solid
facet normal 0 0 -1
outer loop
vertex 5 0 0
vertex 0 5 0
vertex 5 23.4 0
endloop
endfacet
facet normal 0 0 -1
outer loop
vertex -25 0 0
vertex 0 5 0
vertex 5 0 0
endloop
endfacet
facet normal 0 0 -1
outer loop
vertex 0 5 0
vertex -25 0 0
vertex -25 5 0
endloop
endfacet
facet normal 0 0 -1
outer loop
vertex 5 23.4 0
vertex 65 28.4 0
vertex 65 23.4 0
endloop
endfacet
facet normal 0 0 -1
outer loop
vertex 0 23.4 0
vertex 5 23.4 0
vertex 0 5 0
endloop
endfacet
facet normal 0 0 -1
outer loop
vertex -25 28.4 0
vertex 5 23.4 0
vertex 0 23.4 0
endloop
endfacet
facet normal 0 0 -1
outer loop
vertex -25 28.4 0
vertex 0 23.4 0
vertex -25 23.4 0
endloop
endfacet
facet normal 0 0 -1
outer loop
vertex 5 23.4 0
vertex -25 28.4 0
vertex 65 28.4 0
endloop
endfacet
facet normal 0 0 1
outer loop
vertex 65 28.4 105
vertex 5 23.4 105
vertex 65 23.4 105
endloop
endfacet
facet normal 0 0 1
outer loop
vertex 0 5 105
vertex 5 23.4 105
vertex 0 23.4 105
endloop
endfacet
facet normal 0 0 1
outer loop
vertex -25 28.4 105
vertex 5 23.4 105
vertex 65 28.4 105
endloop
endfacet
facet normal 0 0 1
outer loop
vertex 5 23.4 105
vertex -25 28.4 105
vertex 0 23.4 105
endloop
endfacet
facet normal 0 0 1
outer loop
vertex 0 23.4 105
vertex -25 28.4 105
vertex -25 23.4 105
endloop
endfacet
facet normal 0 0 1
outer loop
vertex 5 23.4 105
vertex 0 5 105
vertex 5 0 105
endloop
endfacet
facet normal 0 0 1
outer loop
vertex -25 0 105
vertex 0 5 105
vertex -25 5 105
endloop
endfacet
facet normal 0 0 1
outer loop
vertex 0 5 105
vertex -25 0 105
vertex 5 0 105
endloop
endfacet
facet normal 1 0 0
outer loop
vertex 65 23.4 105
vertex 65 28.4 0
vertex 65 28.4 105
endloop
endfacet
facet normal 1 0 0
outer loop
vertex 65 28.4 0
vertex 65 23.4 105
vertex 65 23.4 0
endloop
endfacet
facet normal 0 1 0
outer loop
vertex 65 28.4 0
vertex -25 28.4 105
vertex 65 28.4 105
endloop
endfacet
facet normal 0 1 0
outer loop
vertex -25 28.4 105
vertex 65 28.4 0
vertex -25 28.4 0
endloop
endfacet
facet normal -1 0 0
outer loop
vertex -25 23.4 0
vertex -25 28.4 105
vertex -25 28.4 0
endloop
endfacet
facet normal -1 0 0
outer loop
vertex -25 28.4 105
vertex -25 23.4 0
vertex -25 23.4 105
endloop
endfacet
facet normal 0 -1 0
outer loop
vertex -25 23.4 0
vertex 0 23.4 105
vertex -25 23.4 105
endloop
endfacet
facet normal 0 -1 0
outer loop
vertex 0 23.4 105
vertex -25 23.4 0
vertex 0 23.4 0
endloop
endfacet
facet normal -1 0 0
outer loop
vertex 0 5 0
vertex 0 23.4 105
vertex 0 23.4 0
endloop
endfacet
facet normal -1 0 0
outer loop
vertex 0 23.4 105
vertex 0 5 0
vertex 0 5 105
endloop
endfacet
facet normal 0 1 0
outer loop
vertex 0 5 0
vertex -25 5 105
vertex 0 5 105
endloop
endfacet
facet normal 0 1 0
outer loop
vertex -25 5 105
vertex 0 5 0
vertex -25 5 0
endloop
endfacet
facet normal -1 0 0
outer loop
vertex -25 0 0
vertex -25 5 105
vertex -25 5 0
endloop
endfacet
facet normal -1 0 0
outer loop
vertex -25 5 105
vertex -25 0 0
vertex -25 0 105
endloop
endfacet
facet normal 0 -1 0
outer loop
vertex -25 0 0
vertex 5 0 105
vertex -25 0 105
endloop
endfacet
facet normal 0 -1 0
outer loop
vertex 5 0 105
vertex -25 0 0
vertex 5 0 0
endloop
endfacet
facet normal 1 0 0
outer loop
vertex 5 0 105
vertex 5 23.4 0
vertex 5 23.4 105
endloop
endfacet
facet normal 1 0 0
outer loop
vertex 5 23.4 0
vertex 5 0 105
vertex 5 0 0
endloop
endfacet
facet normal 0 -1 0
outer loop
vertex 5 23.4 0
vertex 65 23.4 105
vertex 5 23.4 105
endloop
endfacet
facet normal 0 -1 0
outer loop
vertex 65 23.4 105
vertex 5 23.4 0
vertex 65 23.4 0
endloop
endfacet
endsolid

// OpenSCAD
// --- Dimensions ---
shelf_thickness = 18.0;      // Thickness of the shelf (mm)
clamp_gap = 18.4;            // Gap for the shelf (mm)
spine_width = 5.0;           // Width of the vertical spine (mm)
spine_depth = 28.4;          // Depth of the spine (mm)
bottom_jaw_width = 25.0;     // Width of the bottom jaw (mm)
bottom_jaw_depth = 5.0;       // Depth of the bottom jaw (mm)
arm_length = 65.0;           // Length of the arm extending forward (mm)
total_height = 105.0;        // Extrusion length along Z (mm)
hole_diameter = 20.0;        // Diameter of pipette holes (mm)
hole_x_offset = 42.0;        // X position of hole centers (mm)

// Hole Z-positions (as specified for the print orientation)
hole_z_1 = 17.5;
hole_z_2 = 52.5;
hole_z_3 = 87.5;

// --- Constants ---
$fn = 64;

// --- Modeling ---

// The user specified:
// 1. Print orientation: Lying on its side, XY plane is the profile, Z is extrusion (105mm).
// 2. Profile: 
//    - Spine: x=[0, 5], y=[0, 28.4]
//    - Bottom jaw: x=[-25, 5], y=[0, 5]
//    - Top jaw/arm: x=[-25, 65], y=[23.4, 28.4]
// 3. Holes: 20mm diameter, through the arm along Y (vertically in use).
//    - In use, +Y is up. In print orientation, Z is the extrusion (105mm).
//    - If the holes are "vertically in use", they must be parallel to the Y axis in the profile.
//    - However, the user says "through the arm along Y". In the print orientation, 
//      the arm's thickness is along the Z axis. 
//      If the holes are "vertically in use" (+Y is up), the hole axis must be the Y axis.
//      This means the holes cut through the "depth" of the profile.

module profile_shape() {
    union() {
        // Spine: x=[0, 5], y=[0, 28.4]
        translate([0, 0])
            square([spine_width, spine_depth]);
        
        // Bottom Jaw: x=[-25, 5], y=[0, 5]
        translate([-bottom_jaw_width, 0])
            square([bottom_jaw_width + spine_width, bottom_jaw_depth]);
        
        // Top Jaw and Arm: x=[-25, 65], y=[23.4, 28.4]
        translate([-bottom_jaw_width, 23.4])
            square([bottom_jaw_width + arm_length, 5.0]);
    }
}

// The part is built by extruding the 2D profile along Z.
// The holes are drilled through the arm. 
// Since the holes are "vertically in use" (+Y is up) and the arm is in the XY plane,
// the hole axis must be the Y axis.
// This means the holes are cylinders oriented along the Y axis.

difference() {
    // Main Body
    linear_extrude(height = total_height)
        profile_shape();

    // Holes
    // The holes are centered at x=42, and z=17.5, 52.5, 87.5.
    // They go "through the arm along Y".
    // This means the cylinder axis is the Y axis.
    for (z_pos = [hole_z_1, hole_z_2, hole_z_3]) {
        translate([hole_x_offset, -1, z_pos]) // -1 to ensure clean cut through Y=0
            rotate([0, 90, 0])
                cylinder(d = hole_diameter, h = spine_depth + 2);
    }
}

// Note on the previous error: 
// The previous report showed "0 holes" at the slice heights. 
// This happened because the holes were being subtracted from the 2D profile 
// before extrusion, or the cylinder orientation was incorrect.
// To have holes at specific Z heights in an extruded part, 
// the subtraction must happen after the linear_extrude.
